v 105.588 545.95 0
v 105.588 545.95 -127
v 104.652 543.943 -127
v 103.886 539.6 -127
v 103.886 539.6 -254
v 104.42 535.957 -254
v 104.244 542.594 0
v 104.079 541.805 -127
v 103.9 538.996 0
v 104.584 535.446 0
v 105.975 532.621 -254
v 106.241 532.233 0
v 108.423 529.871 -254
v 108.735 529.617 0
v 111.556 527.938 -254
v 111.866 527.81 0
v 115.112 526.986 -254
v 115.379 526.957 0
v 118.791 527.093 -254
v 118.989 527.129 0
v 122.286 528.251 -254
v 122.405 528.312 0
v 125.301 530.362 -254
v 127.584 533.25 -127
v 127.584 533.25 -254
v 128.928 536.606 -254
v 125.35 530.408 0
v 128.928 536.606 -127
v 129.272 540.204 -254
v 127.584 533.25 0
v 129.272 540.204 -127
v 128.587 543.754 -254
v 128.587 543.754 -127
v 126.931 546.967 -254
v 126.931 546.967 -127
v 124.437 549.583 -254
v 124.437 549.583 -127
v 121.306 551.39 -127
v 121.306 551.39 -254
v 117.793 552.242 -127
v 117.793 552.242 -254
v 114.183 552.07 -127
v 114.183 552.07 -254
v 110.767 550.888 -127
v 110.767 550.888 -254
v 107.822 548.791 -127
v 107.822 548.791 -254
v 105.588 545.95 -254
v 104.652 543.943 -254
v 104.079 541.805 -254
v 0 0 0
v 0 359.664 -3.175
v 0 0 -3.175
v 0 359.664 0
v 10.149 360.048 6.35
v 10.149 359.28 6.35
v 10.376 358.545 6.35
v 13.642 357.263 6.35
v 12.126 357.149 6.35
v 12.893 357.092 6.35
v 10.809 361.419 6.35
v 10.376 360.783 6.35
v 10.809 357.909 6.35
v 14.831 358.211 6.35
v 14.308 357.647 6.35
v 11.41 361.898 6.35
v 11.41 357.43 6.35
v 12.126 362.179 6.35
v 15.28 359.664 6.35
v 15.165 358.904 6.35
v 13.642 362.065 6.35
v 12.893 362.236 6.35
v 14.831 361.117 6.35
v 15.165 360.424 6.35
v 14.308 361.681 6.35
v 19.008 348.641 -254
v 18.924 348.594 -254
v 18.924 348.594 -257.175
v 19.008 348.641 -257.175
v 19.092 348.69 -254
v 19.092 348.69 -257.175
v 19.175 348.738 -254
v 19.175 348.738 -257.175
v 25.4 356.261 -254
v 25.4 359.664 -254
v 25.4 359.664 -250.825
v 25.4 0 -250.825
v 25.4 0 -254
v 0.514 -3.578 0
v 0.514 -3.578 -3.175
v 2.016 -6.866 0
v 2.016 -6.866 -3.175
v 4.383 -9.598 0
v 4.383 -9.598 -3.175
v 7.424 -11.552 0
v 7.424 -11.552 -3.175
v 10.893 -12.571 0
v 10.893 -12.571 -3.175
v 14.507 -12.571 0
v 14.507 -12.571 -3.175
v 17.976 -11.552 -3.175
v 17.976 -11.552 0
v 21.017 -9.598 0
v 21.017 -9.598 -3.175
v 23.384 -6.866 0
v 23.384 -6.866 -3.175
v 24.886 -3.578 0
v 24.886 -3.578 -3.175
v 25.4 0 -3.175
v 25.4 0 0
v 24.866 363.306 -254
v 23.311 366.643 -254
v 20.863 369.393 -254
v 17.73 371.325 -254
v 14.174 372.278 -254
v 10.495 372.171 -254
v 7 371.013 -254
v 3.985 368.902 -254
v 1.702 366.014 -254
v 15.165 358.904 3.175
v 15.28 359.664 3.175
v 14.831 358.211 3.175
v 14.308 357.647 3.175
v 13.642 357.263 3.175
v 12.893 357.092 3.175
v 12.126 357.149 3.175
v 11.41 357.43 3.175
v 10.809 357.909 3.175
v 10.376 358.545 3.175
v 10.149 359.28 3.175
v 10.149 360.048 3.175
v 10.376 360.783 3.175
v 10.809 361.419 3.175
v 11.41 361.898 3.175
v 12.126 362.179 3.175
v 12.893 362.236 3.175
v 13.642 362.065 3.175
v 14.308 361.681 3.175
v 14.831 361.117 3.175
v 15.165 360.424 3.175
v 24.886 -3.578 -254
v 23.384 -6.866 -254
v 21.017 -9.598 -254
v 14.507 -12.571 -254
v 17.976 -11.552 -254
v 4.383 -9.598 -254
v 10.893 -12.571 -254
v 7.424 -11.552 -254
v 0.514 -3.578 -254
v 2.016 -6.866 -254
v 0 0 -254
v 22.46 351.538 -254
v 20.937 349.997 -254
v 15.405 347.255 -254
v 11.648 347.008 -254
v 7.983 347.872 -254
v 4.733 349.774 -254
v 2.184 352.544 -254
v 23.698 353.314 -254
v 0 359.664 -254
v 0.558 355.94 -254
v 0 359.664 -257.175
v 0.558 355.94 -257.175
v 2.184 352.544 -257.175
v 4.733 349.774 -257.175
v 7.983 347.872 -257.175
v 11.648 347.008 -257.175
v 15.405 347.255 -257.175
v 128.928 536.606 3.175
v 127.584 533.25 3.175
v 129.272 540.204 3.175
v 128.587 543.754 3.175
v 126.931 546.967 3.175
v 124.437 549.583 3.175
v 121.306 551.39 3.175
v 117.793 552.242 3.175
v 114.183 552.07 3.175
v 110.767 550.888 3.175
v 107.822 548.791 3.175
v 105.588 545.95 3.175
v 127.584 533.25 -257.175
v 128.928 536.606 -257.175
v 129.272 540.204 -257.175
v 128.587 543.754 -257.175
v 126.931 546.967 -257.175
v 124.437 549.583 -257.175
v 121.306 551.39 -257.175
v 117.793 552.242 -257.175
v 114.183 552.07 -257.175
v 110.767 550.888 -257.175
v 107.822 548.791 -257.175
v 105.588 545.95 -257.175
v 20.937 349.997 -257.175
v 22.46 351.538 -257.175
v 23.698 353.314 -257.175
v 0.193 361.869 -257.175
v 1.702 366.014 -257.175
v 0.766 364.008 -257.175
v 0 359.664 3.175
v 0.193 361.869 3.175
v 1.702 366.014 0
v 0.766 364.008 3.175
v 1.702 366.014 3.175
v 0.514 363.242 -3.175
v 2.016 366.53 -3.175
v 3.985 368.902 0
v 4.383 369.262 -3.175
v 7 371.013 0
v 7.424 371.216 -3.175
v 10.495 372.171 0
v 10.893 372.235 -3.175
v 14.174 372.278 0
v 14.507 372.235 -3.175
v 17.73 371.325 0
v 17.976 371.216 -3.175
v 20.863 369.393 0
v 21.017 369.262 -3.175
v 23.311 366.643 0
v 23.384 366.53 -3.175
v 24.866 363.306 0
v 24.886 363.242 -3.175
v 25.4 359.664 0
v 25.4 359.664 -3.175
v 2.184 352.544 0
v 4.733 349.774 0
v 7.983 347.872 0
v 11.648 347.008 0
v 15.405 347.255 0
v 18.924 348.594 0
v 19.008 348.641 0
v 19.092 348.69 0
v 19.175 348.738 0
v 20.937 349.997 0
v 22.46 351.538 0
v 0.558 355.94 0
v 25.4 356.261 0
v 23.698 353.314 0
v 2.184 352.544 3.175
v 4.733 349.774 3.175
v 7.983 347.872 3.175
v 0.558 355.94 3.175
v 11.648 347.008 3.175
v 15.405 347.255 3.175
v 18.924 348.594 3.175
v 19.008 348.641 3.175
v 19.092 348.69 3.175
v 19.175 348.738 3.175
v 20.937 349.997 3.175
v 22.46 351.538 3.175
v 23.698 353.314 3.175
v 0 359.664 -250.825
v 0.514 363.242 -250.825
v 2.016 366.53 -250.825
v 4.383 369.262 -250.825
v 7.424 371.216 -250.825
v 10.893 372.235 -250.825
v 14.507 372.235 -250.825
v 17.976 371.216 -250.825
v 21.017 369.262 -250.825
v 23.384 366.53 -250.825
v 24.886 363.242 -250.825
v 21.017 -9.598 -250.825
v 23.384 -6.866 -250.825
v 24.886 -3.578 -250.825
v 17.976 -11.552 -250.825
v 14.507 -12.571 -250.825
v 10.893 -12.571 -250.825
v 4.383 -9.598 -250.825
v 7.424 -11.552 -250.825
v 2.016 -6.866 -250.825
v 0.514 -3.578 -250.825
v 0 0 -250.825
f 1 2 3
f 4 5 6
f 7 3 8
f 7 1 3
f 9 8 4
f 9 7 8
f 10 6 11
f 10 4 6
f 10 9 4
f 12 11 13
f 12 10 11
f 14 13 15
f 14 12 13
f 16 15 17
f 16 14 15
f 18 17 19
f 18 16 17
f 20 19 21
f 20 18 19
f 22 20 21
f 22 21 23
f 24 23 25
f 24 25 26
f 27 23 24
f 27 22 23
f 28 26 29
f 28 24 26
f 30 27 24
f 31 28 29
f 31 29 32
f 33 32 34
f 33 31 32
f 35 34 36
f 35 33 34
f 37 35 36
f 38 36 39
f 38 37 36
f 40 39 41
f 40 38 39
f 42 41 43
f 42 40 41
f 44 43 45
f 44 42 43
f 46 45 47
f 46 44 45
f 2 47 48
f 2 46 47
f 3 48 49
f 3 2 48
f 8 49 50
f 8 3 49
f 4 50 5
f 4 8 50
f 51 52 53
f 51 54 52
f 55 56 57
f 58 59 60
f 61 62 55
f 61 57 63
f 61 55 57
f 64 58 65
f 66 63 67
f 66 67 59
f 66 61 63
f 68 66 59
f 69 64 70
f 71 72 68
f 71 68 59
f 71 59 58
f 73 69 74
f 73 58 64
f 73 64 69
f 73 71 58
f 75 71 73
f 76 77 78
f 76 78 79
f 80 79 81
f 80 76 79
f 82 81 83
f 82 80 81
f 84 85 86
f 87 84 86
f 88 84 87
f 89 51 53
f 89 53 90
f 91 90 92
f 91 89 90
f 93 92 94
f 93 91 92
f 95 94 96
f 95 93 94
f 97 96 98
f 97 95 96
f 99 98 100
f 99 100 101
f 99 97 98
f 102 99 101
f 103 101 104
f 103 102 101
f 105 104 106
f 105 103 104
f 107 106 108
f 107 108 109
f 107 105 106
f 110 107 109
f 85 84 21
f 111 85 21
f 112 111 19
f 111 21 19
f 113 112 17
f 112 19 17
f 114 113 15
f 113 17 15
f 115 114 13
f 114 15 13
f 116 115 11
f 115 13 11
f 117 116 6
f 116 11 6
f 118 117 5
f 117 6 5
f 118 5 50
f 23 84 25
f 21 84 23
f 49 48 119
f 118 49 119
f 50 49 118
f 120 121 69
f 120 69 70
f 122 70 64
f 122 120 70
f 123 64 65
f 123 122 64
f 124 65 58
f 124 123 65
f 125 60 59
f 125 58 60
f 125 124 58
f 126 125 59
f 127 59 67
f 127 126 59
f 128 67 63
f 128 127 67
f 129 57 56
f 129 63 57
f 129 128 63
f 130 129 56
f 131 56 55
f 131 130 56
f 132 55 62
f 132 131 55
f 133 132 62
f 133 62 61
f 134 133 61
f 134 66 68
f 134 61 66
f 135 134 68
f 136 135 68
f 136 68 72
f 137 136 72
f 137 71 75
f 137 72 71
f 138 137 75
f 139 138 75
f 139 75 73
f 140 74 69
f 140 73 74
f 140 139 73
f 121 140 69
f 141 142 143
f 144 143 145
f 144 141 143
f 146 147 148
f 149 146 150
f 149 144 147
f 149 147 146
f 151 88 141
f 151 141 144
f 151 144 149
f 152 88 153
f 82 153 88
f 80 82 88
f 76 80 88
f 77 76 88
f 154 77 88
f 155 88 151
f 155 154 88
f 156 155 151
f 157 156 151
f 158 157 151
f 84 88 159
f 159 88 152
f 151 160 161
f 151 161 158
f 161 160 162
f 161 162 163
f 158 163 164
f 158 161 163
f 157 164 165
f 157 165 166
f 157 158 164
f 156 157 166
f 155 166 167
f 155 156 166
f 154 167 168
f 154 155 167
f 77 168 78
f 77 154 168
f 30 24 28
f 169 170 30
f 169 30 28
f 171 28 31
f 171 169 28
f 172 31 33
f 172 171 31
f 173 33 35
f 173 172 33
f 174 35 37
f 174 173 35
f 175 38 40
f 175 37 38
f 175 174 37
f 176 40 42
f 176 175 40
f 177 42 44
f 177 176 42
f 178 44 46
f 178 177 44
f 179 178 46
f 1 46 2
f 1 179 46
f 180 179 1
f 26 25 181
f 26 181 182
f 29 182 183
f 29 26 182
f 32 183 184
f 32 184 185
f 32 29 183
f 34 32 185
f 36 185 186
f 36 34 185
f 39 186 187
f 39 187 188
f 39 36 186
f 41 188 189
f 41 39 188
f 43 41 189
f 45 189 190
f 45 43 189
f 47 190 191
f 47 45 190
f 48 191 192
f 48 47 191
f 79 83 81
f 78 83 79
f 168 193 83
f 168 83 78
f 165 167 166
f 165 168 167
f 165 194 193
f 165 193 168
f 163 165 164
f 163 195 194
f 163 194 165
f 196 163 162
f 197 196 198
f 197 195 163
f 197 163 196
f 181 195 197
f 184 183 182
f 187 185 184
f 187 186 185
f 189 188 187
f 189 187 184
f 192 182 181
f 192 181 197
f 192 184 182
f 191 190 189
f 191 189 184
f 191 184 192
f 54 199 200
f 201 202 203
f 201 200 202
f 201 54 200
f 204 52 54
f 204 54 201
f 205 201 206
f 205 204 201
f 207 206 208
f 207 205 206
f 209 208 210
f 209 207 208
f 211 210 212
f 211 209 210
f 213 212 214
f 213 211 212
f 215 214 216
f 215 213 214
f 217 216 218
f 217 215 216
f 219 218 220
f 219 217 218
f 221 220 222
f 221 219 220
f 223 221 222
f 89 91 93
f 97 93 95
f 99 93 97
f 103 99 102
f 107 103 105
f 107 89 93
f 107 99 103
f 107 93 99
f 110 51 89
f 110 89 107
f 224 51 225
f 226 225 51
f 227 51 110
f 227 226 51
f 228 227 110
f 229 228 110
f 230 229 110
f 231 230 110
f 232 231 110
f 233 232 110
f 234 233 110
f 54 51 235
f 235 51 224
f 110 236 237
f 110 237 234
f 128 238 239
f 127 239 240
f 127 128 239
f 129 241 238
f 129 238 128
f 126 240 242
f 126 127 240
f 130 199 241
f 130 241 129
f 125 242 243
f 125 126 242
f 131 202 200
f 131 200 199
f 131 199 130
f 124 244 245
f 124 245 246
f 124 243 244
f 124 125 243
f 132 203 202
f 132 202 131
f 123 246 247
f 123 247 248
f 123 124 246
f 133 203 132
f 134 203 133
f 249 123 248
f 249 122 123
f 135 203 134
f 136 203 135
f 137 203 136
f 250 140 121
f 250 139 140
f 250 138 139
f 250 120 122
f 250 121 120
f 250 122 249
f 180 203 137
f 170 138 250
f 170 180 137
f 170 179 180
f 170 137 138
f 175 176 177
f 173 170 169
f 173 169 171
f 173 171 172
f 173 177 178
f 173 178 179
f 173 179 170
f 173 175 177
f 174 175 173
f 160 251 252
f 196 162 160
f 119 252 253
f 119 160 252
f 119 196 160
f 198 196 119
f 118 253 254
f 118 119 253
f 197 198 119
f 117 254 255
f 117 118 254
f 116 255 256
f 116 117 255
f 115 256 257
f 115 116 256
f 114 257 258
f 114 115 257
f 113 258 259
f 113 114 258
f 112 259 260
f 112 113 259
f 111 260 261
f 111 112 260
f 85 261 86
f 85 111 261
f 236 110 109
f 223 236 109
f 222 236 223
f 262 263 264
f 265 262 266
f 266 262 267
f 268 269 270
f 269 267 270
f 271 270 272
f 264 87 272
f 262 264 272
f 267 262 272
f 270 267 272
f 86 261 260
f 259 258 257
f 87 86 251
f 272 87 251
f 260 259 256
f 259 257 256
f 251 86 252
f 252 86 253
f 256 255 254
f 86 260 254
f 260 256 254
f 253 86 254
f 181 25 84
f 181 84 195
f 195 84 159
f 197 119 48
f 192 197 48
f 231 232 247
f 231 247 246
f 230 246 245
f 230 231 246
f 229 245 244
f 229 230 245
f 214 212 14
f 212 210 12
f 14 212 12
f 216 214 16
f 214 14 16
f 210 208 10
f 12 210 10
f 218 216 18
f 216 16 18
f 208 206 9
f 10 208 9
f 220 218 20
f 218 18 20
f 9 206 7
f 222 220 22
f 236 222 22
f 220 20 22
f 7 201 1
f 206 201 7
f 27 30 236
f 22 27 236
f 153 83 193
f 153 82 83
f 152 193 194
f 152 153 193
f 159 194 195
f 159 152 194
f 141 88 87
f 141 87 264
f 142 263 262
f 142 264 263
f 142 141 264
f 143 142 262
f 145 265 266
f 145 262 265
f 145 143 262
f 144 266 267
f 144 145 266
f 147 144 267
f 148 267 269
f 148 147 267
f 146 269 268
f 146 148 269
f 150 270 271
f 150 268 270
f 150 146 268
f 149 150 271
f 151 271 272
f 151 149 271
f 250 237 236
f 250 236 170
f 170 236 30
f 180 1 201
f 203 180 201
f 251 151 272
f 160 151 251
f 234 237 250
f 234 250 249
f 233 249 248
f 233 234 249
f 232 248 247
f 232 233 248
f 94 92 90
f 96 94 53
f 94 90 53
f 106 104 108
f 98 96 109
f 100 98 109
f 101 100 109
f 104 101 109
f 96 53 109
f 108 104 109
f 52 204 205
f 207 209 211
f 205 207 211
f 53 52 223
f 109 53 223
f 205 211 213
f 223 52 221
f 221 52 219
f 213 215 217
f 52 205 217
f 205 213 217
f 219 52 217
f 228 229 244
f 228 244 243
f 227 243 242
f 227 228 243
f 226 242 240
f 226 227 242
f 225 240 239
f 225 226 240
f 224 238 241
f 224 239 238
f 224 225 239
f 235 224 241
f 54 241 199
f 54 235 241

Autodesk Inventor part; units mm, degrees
ref_plane "YZ Plane" through (0, 0, 0) normal (1, 0, 0) x (0, 1, 0)
sketch "Sketch1" plane through (0, 0, 0) normal (0, 0, 1) x (1, 0, 0)
  line L0 (25.4, 0) -> (25.4, 359.664)
  line L1 (0, 359.664) -> (0, 0)
  arc A0 (0, 0) -> (25.4, 0) centre (12.7, 0) ccw
  arc A1 (25.4, 359.664) -> (0, 359.664) centre (12.7, 359.664) ccw
sketch "Sketch2" plane through (0, 0, 0) normal (0, 0, 1) x (1, 0, 0)
  line L0 (-287.7794, 186.1816) -> (71.8846, 186.1816) construction
  arc A0 (25.4, 359.664) -> (0, 359.664) centre (12.7, 359.664) ccw projected
  arc A1 (18.9244, 348.5939) -> (19.1748, 348.7385) centre (12.7, 359.664) ccw
  arc A2 (6.4756, 370.7341) -> (6.2252, 370.5895) centre (12.7, 359.664) ccw
  line L1 (12.7, 359.664) -> (220.472, 359.664) construction
  line L2 (23.6985, 353.314) -> (127.5845, 533.2498)
  line L3 (105.5875, 545.9498) -> (1.7015, 366.014)
  arc A3 (1.7015, 366.014) -> (23.6985, 353.314) centre (12.7, 359.664) ccw
  arc A4 (127.5845, 533.2498) -> (105.5875, 545.9498) centre (116.586, 539.5998) ccw
  point P0 (0, 0)
extrude "Extrusion1" add sketch "Sketch2" along normal blind 3.175
extrude "Extrusion2" add sketch "Sketch1" against normal blind 3.175
sketch "Sketch3" plane through (0, 0, 3.175) normal (0, 0, 1) x (1, 0, 0)
  circle A0 centre (12.7, 359.664) radius 2.5797
  point P0 (0, 0)
  dimension "d12" = 5.1594
extrude "Extrusion3" add sketch "Sketch3" along normal blind 3.175
sketch "Sketch4" plane through (0, 0, 0) normal (0, 0, -1) x (-1, 0, 0)
  arc A0 (-105.5875, 545.9498) -> (-127.5845, 533.2498) centre (-116.586, 539.5998) ccw projected
  circle A1 centre (-116.586, 539.5998) radius 12.7
  point P0 (0, 0)
extrude "Extrusion4" add sketch "Sketch4" along normal blind 127
ref_plane "Work Plane2" through (127.5845, 533.2498, -119.0625) normal (0, 0, 1) x (1, 0, 0)
ref_plane "Work Plane1" through (127.5845, 533.2498, 1.5875) normal (0, 0, 1) x (1, 0, 0)
ref_plane "Work Plane3" through (116.586, 539.5998, -127) normal (0, 0, -1) x (-1, 0, 0)
mirror "Mirror2" about plane through (116.586, 539.5998, -127) normal (0, 0, -1) of "Extrusion1", "Extrusion2"
sketch "Sketch5" plane through (116.586, 539.5998, -127) normal (0, 0, -1) x (-1, 0, 0)
  circle A0 centre (0, 0) radius 12.7 projected
  circle A1 centre (0, 0) radius 12.7
  point P0 (116.586, -539.5998)
extrude "Extrusion5" add sketch "Sketch5" along normal blind 127
properties part number "cart handle"
